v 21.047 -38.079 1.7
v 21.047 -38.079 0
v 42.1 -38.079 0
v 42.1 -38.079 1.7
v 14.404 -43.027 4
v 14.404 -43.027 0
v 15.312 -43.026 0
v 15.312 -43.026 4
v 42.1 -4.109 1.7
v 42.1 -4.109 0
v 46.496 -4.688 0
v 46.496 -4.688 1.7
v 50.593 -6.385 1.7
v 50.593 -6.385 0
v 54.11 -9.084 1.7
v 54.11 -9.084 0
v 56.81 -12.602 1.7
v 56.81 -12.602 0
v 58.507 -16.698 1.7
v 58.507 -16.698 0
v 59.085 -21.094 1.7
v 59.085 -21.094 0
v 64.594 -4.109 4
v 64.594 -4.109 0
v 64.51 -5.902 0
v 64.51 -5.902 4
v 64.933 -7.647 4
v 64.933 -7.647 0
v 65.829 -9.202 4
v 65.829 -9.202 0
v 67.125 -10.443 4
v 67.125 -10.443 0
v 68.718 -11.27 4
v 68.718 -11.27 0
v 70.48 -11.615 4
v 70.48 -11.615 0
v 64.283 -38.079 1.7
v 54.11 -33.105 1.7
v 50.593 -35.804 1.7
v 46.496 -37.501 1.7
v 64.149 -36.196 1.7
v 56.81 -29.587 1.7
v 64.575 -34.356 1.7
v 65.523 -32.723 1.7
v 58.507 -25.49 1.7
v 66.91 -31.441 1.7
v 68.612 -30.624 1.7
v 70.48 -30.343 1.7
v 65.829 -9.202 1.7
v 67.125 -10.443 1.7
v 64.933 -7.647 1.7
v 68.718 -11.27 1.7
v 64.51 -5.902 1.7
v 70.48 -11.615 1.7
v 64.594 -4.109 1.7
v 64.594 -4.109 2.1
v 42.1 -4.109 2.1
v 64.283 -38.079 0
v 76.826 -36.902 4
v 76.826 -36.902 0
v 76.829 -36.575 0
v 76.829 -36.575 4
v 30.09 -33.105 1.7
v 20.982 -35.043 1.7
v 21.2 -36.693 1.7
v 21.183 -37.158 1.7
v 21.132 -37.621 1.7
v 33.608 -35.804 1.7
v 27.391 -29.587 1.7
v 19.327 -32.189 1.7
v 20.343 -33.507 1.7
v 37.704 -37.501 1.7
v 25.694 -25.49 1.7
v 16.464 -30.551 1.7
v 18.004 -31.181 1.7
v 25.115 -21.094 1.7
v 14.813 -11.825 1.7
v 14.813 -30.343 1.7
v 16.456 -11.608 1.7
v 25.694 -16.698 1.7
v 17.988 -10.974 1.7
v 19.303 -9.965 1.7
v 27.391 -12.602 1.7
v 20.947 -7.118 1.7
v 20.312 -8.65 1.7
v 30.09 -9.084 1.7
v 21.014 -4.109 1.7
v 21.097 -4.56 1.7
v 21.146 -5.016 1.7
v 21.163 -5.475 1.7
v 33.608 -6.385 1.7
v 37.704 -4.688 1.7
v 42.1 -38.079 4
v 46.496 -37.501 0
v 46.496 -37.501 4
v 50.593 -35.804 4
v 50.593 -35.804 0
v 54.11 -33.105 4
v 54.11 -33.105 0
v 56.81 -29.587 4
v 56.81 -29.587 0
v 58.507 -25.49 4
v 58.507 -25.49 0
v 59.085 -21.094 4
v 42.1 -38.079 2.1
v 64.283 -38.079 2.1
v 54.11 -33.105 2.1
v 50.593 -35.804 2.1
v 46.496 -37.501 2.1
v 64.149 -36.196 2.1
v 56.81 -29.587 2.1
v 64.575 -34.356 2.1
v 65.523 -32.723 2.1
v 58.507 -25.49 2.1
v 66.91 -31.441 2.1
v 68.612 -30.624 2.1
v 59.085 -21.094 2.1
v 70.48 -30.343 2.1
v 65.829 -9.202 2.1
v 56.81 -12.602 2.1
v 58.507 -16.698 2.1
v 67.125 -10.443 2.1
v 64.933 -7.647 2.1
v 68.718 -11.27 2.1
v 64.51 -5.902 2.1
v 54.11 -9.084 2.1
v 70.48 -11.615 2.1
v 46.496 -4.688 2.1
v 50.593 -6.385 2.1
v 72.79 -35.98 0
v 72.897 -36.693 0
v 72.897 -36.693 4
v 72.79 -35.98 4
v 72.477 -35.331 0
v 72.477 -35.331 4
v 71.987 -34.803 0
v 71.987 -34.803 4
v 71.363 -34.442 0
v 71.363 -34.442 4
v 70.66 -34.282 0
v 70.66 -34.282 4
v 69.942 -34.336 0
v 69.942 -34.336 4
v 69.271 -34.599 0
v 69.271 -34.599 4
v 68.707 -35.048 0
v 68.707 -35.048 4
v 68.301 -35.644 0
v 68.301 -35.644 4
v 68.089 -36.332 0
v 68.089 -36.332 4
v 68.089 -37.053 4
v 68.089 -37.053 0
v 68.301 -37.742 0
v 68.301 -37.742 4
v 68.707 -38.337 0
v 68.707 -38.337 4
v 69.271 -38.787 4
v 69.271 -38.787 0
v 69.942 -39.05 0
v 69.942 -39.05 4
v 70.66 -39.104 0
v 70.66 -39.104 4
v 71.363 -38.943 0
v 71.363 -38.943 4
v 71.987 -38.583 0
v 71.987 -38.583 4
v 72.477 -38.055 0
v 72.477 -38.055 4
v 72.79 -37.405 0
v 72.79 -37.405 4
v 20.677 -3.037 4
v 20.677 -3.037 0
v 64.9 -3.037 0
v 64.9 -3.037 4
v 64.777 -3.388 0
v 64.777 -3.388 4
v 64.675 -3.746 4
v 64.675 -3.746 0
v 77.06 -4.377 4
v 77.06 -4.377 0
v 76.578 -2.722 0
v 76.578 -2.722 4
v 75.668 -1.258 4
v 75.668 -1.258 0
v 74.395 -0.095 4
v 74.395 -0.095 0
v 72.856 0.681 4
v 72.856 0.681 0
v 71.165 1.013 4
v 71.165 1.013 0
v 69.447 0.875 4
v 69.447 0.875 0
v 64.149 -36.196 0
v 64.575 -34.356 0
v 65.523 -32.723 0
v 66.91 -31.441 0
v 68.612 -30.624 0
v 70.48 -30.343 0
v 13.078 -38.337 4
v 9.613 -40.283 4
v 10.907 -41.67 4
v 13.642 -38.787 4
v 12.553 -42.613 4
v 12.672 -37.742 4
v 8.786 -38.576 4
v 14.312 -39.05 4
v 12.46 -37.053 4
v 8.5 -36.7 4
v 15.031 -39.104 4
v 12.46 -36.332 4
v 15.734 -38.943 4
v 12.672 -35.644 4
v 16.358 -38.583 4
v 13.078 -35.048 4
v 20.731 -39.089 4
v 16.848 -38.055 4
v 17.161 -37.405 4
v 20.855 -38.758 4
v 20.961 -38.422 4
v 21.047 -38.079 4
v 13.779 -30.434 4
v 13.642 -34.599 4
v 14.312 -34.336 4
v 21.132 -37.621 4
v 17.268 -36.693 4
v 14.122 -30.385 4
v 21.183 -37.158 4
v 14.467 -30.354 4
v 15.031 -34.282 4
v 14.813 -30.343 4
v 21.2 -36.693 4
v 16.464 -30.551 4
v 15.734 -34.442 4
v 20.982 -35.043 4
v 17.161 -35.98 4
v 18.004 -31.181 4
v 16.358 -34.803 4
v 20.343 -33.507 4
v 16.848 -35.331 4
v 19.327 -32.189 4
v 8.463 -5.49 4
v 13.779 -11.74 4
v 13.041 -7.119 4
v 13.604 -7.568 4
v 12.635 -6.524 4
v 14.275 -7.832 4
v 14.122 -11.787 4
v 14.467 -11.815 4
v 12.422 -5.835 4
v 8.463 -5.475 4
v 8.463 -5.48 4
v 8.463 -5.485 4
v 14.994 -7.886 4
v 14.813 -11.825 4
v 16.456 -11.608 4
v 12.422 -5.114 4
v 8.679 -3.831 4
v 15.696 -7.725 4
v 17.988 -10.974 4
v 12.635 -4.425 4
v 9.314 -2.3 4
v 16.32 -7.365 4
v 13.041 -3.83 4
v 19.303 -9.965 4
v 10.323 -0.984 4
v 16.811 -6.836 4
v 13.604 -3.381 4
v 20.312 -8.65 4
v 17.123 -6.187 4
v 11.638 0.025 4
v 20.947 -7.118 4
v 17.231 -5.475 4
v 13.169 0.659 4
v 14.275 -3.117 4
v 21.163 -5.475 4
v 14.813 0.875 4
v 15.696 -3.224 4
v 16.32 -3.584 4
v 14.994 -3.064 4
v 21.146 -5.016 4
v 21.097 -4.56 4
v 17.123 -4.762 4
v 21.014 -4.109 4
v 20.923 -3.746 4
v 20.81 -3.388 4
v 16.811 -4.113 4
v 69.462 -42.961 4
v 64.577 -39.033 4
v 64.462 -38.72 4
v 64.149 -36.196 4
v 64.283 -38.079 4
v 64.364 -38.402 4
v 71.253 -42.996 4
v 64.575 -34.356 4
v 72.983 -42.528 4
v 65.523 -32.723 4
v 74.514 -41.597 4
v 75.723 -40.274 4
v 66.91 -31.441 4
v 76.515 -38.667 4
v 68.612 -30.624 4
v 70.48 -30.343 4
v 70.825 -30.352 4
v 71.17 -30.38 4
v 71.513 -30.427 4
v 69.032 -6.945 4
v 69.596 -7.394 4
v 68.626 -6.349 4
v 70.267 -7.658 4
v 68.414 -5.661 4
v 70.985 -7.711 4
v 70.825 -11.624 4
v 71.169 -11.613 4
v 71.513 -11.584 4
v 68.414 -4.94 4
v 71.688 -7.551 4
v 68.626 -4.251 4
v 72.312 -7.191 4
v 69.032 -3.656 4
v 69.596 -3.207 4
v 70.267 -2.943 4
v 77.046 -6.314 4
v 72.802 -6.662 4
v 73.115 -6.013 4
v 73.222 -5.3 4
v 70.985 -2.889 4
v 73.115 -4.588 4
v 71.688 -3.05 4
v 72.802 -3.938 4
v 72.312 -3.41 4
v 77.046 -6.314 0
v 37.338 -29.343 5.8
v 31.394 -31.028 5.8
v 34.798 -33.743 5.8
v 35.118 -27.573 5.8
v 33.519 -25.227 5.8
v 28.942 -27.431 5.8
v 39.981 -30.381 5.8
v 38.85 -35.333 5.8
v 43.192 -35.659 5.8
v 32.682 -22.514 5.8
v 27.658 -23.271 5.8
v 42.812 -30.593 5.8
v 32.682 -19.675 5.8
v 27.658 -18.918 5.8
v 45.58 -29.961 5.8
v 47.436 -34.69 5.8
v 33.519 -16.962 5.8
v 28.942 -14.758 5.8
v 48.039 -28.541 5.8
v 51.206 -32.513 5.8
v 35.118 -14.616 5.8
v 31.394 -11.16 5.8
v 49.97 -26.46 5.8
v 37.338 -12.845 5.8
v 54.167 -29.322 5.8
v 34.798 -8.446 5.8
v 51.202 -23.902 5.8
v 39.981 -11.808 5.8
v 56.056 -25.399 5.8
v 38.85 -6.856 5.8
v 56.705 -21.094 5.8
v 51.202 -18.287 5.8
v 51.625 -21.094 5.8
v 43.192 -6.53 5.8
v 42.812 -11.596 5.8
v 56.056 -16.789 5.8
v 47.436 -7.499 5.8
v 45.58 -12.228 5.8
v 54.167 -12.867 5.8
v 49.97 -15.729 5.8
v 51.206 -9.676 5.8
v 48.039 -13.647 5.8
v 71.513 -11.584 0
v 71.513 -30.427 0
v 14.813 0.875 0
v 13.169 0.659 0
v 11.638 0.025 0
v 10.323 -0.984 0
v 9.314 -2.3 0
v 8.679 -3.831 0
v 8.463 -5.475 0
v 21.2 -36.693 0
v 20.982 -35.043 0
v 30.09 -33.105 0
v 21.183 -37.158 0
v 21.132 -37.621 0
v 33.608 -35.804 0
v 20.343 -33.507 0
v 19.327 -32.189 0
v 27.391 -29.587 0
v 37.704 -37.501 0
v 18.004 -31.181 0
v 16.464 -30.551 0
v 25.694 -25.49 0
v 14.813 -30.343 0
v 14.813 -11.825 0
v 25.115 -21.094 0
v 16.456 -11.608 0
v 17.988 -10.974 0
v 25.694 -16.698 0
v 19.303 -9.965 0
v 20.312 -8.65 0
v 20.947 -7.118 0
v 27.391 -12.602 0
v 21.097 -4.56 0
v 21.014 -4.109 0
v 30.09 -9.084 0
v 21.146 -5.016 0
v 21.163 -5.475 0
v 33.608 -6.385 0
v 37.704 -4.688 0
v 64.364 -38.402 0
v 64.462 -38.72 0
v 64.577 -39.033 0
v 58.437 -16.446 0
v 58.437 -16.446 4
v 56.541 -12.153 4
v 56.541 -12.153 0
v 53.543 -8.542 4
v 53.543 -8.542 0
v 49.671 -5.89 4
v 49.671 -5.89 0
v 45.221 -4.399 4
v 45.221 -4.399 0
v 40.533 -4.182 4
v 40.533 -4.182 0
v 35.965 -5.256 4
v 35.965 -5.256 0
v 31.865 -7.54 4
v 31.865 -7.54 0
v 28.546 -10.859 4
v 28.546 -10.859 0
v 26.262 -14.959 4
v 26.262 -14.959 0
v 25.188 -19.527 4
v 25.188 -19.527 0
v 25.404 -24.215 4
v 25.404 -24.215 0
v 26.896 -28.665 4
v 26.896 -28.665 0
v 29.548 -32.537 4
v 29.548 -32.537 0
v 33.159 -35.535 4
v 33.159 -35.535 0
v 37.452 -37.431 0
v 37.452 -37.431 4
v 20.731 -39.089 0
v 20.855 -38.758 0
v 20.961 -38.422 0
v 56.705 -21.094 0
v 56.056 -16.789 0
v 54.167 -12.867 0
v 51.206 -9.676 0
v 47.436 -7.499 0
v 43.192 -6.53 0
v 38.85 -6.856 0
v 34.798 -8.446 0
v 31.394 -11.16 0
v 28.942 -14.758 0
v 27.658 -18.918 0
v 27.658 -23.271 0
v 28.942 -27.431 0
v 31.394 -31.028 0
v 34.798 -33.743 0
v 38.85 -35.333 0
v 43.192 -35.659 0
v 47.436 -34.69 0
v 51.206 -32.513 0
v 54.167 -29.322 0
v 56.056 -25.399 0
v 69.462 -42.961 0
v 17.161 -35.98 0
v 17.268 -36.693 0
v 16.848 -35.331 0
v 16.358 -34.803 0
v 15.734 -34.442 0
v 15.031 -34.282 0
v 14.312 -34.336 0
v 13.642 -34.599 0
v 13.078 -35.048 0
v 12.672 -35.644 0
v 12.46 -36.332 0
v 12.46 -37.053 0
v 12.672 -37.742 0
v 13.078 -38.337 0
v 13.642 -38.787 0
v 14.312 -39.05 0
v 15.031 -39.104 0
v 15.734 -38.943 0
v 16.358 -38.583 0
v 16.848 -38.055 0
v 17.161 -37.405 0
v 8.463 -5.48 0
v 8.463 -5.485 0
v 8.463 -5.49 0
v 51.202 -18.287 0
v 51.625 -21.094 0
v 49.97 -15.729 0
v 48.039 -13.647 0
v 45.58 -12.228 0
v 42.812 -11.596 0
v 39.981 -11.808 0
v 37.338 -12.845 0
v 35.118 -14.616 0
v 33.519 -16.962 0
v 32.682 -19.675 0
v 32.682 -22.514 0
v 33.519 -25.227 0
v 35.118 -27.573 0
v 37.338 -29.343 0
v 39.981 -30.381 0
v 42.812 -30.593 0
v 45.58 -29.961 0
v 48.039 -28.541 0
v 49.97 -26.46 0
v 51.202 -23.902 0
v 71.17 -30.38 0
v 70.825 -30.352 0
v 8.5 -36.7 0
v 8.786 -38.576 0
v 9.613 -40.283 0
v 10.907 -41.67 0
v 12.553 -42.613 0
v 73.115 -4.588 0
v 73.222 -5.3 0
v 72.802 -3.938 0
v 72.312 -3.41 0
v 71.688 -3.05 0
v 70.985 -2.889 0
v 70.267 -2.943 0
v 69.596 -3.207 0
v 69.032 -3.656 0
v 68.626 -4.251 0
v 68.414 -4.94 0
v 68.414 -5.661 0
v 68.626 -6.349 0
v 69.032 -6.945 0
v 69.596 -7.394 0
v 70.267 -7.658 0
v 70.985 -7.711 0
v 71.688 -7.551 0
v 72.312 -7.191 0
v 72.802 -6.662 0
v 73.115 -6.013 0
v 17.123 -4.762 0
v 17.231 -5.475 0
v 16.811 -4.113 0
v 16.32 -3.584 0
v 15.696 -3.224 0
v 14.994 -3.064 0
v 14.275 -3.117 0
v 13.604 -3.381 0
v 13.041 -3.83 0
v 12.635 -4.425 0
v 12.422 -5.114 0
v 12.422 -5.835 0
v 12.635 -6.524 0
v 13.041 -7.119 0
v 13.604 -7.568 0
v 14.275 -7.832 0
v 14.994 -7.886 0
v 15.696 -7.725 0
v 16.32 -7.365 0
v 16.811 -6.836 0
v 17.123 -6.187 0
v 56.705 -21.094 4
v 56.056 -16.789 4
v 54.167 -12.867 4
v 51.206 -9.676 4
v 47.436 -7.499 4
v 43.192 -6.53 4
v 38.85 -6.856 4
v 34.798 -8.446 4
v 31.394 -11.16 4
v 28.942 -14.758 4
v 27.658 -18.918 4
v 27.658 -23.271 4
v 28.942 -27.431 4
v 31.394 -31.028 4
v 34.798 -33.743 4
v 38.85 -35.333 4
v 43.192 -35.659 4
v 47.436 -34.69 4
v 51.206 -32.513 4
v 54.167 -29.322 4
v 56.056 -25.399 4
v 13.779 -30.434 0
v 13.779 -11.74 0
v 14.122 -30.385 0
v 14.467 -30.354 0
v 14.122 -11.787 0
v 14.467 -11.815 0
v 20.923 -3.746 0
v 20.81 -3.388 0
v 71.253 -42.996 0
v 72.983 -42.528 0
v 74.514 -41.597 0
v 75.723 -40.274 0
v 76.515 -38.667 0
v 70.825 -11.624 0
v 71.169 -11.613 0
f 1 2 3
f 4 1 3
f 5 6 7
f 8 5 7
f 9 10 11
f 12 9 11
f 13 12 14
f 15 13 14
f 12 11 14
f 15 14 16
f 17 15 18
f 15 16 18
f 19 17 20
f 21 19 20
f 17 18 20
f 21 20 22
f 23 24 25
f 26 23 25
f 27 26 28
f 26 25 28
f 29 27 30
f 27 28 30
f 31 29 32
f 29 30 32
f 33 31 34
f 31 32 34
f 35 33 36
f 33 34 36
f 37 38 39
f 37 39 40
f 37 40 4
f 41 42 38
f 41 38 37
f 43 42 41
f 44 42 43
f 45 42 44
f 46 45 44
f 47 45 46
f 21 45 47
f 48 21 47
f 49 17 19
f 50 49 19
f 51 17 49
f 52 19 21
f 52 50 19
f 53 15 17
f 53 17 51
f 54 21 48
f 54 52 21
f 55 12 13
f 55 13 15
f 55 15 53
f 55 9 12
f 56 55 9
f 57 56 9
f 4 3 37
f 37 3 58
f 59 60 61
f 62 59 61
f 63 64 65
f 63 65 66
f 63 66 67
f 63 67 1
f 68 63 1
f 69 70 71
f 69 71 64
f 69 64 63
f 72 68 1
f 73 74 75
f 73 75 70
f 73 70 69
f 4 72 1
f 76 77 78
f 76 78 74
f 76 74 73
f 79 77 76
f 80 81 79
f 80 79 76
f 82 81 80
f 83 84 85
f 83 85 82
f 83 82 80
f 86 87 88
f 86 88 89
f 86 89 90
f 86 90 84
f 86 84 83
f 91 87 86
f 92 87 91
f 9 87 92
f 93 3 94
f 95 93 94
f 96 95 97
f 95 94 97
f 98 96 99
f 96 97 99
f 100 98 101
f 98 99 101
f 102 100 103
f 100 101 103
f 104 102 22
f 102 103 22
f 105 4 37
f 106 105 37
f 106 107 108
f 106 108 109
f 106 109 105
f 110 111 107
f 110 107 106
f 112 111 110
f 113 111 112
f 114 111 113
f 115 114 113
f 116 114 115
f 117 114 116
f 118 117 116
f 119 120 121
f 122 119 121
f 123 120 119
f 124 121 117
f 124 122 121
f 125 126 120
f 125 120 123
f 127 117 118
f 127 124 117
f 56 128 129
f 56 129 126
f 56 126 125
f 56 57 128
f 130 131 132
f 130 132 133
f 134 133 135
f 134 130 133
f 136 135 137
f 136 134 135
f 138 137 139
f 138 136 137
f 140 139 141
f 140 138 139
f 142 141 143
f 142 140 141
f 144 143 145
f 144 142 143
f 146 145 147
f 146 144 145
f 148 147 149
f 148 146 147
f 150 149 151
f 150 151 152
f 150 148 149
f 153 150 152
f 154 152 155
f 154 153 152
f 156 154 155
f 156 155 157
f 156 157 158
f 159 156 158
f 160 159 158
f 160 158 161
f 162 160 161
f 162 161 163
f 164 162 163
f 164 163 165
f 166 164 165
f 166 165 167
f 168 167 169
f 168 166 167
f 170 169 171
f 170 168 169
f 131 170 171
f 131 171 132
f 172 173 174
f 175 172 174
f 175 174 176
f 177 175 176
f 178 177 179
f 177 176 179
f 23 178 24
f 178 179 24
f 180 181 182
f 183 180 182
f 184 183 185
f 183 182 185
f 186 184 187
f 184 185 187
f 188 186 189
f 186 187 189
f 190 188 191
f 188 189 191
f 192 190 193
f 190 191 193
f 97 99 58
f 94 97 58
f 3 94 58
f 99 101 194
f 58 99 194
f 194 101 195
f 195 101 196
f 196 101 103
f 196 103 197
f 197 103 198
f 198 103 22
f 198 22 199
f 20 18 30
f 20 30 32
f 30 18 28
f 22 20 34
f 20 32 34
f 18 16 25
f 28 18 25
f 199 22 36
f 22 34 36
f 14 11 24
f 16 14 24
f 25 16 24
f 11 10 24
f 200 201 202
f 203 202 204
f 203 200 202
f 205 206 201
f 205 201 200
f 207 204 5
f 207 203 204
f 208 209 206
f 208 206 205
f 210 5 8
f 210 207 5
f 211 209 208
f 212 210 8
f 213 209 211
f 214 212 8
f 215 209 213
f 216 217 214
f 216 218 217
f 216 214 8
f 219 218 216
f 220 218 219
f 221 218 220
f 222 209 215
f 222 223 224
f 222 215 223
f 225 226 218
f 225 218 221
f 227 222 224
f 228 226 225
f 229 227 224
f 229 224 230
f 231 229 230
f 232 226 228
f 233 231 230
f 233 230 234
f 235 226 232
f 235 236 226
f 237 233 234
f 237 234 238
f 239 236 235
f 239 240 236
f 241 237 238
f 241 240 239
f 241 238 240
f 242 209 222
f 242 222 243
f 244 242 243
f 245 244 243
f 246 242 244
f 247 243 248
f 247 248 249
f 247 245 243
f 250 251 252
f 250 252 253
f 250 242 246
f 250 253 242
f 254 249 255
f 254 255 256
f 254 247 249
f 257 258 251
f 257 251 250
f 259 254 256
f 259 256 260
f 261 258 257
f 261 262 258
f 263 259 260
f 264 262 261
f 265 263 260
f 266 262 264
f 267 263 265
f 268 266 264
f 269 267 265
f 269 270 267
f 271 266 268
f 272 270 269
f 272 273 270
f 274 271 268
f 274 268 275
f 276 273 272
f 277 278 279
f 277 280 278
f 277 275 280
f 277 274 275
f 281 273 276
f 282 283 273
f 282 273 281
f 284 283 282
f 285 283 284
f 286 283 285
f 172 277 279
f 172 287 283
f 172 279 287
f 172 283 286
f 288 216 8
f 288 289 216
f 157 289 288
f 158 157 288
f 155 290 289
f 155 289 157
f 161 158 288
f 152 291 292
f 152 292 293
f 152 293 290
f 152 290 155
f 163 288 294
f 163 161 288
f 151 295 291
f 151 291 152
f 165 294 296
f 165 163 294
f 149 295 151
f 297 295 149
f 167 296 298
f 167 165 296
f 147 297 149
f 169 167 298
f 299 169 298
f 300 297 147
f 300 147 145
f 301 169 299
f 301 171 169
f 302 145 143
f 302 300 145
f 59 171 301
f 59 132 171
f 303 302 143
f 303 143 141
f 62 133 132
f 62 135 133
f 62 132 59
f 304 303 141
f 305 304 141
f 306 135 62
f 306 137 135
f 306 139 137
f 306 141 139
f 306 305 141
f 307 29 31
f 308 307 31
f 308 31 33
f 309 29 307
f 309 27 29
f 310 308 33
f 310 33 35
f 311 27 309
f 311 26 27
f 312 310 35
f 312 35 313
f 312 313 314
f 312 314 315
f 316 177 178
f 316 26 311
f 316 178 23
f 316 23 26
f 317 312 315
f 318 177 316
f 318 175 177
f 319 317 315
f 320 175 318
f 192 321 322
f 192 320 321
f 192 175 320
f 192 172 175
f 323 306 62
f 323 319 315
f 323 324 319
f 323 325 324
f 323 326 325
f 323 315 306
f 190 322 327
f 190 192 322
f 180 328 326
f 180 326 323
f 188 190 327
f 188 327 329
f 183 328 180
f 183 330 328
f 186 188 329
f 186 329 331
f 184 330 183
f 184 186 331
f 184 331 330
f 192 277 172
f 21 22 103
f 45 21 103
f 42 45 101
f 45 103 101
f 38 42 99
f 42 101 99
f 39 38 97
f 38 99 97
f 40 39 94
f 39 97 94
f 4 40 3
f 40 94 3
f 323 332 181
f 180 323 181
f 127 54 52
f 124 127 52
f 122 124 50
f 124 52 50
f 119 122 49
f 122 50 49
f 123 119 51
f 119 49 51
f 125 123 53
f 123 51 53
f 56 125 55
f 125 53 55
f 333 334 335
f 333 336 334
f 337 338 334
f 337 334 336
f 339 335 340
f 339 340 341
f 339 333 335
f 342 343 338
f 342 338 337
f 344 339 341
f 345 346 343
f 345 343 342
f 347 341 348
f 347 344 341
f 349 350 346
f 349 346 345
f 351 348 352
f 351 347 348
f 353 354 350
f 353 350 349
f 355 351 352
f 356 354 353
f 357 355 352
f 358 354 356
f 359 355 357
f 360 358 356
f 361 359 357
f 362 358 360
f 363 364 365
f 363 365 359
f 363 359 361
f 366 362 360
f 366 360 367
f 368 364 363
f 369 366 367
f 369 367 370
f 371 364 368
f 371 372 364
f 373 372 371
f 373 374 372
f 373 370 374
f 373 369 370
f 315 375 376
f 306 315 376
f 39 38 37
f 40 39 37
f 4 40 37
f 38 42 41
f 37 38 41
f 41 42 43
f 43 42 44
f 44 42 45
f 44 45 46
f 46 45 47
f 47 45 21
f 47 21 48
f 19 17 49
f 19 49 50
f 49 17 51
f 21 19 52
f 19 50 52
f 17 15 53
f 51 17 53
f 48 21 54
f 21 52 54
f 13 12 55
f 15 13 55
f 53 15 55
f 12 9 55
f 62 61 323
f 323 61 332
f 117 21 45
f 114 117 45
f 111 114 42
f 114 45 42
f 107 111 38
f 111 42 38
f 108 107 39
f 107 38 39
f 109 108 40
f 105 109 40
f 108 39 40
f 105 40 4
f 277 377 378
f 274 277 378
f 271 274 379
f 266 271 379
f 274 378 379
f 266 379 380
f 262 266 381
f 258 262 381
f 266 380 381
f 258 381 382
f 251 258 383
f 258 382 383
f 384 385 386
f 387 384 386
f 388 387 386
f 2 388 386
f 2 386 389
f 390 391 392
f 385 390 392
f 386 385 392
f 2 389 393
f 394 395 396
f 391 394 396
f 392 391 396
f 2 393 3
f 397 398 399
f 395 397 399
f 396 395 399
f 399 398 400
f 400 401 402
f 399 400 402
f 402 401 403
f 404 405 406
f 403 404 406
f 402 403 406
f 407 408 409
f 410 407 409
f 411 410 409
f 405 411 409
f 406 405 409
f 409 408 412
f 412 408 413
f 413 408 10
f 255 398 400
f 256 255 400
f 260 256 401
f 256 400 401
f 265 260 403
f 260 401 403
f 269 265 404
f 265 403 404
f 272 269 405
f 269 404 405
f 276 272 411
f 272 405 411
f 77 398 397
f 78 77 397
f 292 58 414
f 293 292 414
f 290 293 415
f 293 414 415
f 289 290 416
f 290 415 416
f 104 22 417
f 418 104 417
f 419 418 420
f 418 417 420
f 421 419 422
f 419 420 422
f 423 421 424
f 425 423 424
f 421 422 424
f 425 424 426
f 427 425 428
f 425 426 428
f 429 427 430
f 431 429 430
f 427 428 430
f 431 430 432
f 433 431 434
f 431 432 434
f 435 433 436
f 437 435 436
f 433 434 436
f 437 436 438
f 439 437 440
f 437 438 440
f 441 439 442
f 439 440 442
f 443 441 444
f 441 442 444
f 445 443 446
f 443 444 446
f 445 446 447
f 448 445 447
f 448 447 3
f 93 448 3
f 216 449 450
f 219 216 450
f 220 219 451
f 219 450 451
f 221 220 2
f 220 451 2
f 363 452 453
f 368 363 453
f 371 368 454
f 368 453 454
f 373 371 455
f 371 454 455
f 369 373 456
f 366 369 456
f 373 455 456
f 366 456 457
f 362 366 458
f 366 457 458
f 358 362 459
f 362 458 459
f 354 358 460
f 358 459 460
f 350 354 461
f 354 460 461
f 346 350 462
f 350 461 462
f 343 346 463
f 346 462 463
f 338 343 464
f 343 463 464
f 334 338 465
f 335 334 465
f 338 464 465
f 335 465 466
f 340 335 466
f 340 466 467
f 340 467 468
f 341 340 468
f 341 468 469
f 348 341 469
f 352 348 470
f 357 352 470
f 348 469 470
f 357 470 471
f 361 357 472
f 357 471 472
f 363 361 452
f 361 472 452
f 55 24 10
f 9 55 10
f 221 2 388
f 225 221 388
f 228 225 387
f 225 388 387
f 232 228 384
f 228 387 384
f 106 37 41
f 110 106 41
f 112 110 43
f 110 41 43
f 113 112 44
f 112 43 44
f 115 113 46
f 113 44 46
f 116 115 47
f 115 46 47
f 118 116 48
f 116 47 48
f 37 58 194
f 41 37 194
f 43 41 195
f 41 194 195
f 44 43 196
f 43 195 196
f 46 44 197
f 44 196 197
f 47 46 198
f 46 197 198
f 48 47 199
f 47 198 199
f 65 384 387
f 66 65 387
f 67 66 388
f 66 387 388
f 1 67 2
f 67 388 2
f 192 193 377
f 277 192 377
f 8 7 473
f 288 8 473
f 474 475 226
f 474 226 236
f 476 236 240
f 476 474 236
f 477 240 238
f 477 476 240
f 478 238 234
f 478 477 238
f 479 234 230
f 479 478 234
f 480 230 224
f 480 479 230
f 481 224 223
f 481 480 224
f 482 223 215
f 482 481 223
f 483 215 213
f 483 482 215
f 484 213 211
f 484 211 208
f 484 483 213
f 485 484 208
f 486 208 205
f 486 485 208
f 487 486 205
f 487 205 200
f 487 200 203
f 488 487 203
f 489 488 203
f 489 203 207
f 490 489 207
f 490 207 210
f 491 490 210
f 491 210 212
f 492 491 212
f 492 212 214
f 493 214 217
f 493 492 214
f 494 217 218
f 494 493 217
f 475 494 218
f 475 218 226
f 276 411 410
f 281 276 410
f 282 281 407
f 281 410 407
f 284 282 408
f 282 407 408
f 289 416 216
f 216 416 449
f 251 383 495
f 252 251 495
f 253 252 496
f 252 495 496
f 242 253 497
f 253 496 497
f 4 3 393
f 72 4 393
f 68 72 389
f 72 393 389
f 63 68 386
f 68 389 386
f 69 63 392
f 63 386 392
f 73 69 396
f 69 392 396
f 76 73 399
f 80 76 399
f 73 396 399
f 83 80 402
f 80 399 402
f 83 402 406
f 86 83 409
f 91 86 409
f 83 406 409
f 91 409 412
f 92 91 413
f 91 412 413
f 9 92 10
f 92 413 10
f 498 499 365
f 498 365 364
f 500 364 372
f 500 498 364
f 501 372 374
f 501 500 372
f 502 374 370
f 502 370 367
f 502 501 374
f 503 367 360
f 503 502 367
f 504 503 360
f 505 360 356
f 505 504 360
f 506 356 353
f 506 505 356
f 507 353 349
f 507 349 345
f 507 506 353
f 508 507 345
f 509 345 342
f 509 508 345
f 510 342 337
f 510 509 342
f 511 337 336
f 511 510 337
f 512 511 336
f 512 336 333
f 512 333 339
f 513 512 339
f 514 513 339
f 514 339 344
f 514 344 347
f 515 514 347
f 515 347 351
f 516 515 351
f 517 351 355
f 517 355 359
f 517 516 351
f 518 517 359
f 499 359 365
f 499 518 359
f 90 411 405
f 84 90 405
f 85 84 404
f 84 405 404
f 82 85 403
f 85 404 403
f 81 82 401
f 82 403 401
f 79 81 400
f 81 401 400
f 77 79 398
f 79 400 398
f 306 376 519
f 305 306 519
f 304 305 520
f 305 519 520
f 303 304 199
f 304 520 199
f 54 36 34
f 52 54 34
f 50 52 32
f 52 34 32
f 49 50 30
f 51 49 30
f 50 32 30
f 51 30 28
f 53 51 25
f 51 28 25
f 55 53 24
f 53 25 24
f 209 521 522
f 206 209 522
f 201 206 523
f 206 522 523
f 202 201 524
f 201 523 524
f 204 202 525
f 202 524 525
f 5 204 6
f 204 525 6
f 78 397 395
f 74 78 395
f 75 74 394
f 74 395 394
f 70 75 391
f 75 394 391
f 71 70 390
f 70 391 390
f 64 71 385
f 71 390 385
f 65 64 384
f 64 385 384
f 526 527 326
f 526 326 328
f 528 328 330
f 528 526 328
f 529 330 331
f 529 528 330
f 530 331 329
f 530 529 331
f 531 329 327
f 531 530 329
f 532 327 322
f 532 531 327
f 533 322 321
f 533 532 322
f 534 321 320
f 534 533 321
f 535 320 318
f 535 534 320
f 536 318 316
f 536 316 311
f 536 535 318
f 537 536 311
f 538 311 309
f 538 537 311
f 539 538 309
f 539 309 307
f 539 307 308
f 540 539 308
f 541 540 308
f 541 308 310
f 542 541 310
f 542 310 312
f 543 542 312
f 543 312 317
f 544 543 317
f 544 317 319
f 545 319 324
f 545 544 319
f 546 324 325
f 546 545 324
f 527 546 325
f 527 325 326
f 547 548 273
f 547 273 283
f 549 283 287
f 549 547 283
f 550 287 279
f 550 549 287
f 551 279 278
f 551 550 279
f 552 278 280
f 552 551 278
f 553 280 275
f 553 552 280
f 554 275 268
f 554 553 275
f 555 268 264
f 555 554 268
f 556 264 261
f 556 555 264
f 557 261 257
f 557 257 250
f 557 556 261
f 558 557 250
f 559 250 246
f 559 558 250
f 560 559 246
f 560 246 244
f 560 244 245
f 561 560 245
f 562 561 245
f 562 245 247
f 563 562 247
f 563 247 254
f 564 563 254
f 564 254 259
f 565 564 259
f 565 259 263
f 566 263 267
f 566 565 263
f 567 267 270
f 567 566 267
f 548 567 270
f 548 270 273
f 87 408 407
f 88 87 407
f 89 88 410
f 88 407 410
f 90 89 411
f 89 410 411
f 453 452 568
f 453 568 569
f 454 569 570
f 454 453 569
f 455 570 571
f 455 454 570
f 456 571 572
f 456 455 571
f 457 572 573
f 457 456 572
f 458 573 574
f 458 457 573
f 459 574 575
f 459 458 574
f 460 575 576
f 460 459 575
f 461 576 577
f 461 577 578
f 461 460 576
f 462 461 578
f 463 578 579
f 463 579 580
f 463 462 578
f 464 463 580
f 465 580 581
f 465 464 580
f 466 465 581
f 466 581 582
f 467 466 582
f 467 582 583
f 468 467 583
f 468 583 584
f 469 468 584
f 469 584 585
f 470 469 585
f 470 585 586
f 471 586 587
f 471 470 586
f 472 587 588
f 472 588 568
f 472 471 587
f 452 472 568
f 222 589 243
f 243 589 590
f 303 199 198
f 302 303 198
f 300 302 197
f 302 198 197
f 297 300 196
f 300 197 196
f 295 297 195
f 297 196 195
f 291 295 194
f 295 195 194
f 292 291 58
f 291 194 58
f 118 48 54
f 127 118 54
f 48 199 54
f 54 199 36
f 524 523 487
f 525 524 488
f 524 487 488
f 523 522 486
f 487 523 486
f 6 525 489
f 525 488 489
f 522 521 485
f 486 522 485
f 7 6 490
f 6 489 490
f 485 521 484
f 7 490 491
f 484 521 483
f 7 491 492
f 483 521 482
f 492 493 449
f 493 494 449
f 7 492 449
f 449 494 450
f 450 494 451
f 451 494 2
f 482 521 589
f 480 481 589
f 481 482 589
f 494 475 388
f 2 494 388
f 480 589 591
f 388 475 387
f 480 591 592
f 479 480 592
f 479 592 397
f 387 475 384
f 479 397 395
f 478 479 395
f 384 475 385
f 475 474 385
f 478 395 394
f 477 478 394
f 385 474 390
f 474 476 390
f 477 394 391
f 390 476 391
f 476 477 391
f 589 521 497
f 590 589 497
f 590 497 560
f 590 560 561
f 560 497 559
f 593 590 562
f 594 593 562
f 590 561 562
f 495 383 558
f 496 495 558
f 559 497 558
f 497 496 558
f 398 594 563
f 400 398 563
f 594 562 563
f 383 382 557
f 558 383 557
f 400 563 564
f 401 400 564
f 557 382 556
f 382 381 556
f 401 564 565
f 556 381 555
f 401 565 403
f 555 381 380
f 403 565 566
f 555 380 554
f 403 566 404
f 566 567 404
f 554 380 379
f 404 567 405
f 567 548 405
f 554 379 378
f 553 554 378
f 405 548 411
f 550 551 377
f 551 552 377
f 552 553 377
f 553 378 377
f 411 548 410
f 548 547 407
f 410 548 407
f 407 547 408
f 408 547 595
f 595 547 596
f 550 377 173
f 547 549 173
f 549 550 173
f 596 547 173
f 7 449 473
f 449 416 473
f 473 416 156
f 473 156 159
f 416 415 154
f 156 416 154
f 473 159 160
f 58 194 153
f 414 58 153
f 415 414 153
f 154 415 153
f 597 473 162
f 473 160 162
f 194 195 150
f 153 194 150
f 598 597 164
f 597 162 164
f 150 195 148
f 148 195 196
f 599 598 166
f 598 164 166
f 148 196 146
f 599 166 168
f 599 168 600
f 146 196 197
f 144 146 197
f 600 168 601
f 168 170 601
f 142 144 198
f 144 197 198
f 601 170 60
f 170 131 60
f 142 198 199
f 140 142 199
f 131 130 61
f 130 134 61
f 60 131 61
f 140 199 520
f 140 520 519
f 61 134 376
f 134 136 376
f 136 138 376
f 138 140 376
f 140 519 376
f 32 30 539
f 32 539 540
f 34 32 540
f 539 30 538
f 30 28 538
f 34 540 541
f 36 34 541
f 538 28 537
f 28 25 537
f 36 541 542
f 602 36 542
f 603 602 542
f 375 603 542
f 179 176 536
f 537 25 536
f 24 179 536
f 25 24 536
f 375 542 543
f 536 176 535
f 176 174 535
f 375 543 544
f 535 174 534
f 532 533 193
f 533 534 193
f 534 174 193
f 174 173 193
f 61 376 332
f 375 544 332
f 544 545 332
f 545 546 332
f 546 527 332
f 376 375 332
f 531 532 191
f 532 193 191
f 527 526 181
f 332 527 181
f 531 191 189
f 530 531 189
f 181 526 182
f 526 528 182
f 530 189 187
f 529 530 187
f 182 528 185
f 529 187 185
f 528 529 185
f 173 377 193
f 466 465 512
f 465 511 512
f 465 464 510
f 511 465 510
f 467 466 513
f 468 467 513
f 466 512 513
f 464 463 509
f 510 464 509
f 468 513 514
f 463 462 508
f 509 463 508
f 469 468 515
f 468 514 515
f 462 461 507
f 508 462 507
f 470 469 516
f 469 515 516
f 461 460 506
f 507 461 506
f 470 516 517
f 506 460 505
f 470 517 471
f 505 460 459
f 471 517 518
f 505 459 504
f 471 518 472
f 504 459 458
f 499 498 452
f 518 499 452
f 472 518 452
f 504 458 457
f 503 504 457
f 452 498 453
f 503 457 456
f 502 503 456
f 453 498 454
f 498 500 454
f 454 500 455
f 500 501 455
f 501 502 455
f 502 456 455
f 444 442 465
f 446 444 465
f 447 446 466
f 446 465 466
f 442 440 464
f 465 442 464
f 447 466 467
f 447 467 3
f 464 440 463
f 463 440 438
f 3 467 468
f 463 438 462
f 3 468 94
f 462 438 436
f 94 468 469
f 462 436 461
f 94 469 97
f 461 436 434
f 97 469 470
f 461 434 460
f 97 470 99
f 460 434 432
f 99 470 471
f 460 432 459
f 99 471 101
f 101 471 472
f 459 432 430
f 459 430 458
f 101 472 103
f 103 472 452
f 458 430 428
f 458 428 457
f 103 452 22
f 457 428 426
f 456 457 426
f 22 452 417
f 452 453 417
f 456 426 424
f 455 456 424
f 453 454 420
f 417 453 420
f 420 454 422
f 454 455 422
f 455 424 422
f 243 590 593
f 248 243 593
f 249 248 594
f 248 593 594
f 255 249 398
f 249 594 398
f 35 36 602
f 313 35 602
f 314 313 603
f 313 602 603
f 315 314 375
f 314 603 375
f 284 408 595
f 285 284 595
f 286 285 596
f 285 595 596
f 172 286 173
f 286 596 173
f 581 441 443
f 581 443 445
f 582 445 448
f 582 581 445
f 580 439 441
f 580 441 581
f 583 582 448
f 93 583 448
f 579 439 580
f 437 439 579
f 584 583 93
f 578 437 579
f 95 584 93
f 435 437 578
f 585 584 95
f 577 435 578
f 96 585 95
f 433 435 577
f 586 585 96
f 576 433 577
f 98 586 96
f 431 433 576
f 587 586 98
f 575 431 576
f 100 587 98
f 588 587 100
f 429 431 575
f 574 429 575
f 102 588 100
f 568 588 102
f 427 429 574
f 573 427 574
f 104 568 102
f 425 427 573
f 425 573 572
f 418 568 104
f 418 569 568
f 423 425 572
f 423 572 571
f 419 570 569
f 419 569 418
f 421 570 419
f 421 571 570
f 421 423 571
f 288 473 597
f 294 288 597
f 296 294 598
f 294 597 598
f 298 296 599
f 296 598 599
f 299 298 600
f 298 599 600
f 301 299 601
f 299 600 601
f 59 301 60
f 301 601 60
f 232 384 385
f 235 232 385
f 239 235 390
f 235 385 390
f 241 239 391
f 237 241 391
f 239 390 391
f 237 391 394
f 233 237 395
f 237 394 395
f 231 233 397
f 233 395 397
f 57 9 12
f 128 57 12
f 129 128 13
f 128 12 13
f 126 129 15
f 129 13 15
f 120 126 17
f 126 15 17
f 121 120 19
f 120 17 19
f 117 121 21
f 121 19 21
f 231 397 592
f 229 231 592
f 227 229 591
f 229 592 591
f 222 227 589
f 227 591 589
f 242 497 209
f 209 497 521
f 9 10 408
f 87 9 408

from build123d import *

# Parameters (mm, degrees)
F0_R     = 14.605
F0_R_2   = 9.525
F2_DEPTH = 5.8
F3_DEPTH = 4
F0_R_3   = 2.417765634
F4_DEPTH = 4
F5_DEPTH = 1.7
F6_DEPTH = 0.4


# Not quite as in the source:
# - a feature of the source that left no trace in its solid (it failed there, or was rolled back) is left out


with BuildPart() as f2:
    # F0 (on Top) → F2 (new body)
    with BuildSketch(Plane.XY):
        with Locations((42.1002805233, -21.0943892598)):
            Circle(F0_R)
        with Locations((42.1002805233, -21.0943892598)):
            Circle(F0_R_2, mode=Mode.SUBTRACT)
    extrude(amount=F2_DEPTH)


with BuildPart() as f3:
    # F0 (on Top) → F3 (new body)
    with BuildSketch(Plane.XY):
        with BuildLine():
            ThreePointArc((59.0852805233, -21.0943892598), (54.1104892018, -9.0841805814), (42.1002805233, -4.1093892598))
            ThreePointArc((42.1002805233, -4.1093892598), (25.1152805233, -21.0943892491), (42.1002805018, -38.0793892598))
            ThreePointArc((42.1002805018, -38.0793892598), (54.1104891942, -33.1045979459), (59.0852805233, -21.0943892598))
        make_face()
        with Locations((42.1002805233, -21.0943892598)):
            Circle(F0_R, mode=Mode.SUBTRACT)
    extrude(amount=F3_DEPTH)


with BuildPart() as f4:
    # F0 (on Top) → F4 (new body)
    with BuildSketch(Plane.XY):
        with BuildLine():
            ThreePointArc((70.4796204309, -30.3428000003), (65.5234454038, -32.7230608274), (64.2828575481, -38.0793892598))
            ThreePointArc((64.2828575481, -38.0793892598), (64.4109470876, -38.56194522), (64.5765521859, -39.0329464262))
            ThreePointArc((64.5765521859, -39.0329464262), (66.5006688013, -41.6415820656), (69.4616174351, -42.960668051))
            ThreePointArc((69.4616174351, -42.960668051), (74.513790796, -41.596672905), (76.8261661024, -36.9022231109))
            Line((76.8261661024, -36.9022231109), (76.8285228203, -36.5747387894))
            ThreePointArc((76.8285228203, -36.5747387894), (75.2829744428, -32.5394531286), (71.5131238103, -30.4274691419))
            ThreePointArc((71.5131238103, -30.4274691419), (70.9981033377, -30.3640026837), (70.4796204309, -30.3428000003))
        make_face()
        with Locations((70.4796204309, -36.6928000003)):
            Circle(F0_R_3, mode=Mode.SUBTRACT)
        with BuildLine():
            ThreePointArc((77.0462929913, -6.3138761602), (75.1657734813, -9.8791990856), (71.5131238103, -11.5839077326))
            Line((71.5131238103, -11.5839077326), (71.5131238103, -30.4274691419))
            ThreePointArc((71.5131238103, -30.4274691419), (75.2829744428, -32.5394531286), (76.8285228203, -36.5747387894))
            Line((76.8285228203, -36.5747387894), (77.0462929913, -6.3138761602))
        make_face()
        with BuildLine():
            ThreePointArc((69.4468072263, 0.8754916674), (66.6800084328, -0.5074468562), (64.9001725386, -3.0372450128))
            ThreePointArc((64.9001725386, -3.0372450128), (64.7236558931, -3.5665671194), (64.5944887824, -4.1093892598))
            ThreePointArc((64.5944887824, -4.1093892598), (65.8285113374, -9.2019743288), (70.4796204309, -11.6153575458))
            ThreePointArc((70.4796204309, -11.6153575458), (70.9970160236, -11.6207925725), (71.5131238103, -11.5839077326))
            ThreePointArc((71.5131238103, -11.5839077326), (75.1657734813, -9.8791990856), (77.0462929913, -6.3138761602))
            Line((77.0462929913, -6.3138761602), (77.0602332407, -4.3767698617))
            ThreePointArc((77.0602332407, -4.3767698617), (74.3954165151, -0.0954010996), (69.4468072263, 0.8754916674))
        make_face()
        with Locations((70.8046832573, -5.3003555452)):
            Circle(F0_R_3, mode=Mode.SUBTRACT)
        with BuildLine():
            ThreePointArc((14.8128727451, 0.8754916674), (18.3374917259, -0.1925048263), (20.6765104821, -3.0372450128))
            Line((20.6765104821, -3.0372450128), (64.9001725386, -3.0372450128))
            ThreePointArc((64.9001725386, -3.0372450128), (66.6800084328, -0.5074468562), (69.4468072263, 0.8754916674))
            Line((69.4468072263, 0.8754916674), (14.8128727451, 0.8754916674))
        make_face()
        with BuildLine():
            ThreePointArc((14.8128727451, -11.8245083326), (19.3030008056, -9.9646363931), (21.1628727451, -5.4745083326))
            ThreePointArc((21.1628727451, -5.4745083326), (21.1256456301, -4.7879236676), (21.0144007759, -4.1093892598))
            ThreePointArc((21.0144007759, -4.1093892598), (20.8692272239, -3.5658254287), (20.6765104821, -3.0372450128))
            ThreePointArc((20.6765104821, -3.0372450128), (18.3374917259, -0.1925048263), (14.8128727451, 0.8754916674))
            ThreePointArc((14.8128727451, 0.8754916674), (10.3227446846, -0.984380272), (8.4628727451, -5.4745083326))
            ThreePointArc((8.4628727451, -5.4745083326), (9.9708557742, -9.5827161722), (13.7785803527, -11.7397089875))
            ThreePointArc((13.7785803527, -11.7397089875), (14.2939913324, -11.8032729892), (14.8128727451, -11.8245083326))
        make_face()
        with Locations((14.8128727451, -5.4745083326)):
            Circle(F0_R_3, mode=Mode.SUBTRACT)
        with BuildLine():
            ThreePointArc((13.7785803527, -11.7397089875), (9.9708557742, -9.5827161722), (8.4628727451, -5.4745083326))
            Line((8.4628727451, -5.4745083326), (8.5004888147, -36.7004494693))
            ThreePointArc((8.5004888147, -36.7004494693), (9.9936868257, -32.6020764465), (13.7785803527, -30.4339245321))
            Line((13.7785803527, -30.4339245321), (13.7785803527, -11.7397089875))
        make_face()
        with BuildLine():
            ThreePointArc((21.2004842073, -36.6928000003), (19.3272948586, -32.1893939124), (14.8128727451, -30.3429113889))
            ThreePointArc((14.8128727451, -30.3429113889), (14.2938632343, -30.3672428634), (13.7785803527, -30.4339245321))
            ThreePointArc((13.7785803527, -30.4339245321), (9.9936868257, -32.6020764465), (8.5004888147, -36.7004494693))
            ThreePointArc((8.5004888147, -36.7004494693), (10.207762887, -41.024963287), (14.4039206737, -43.0270782552))
            Line((14.4039206737, -43.0270782552), (15.3123271424, -43.0259825418))
            ThreePointArc((15.3123271424, -43.0259825418), (18.5830125205, -41.8299910996), (20.7310672048, -39.0888892326))
            ThreePointArc((20.7310672048, -39.0888892326), (20.9102155072, -38.5907348182), (21.0472470901, -38.0793892598))
            ThreePointArc((21.0472470901, -38.0793892598), (21.1620586664, -37.390315482), (21.2004842073, -36.6928000003))
        make_face()
        with Locations((14.8504842073, -36.6928000003)):
            Circle(F0_R_3, mode=Mode.SUBTRACT)
        with BuildLine():
            Line((64.5765521859, -39.0329464262), (20.7310672048, -39.0888892326))
            ThreePointArc((20.7310672048, -39.0888892326), (18.5830125205, -41.8299910996), (15.3123271424, -43.0259825418))
            Line((15.3123271424, -43.0259825418), (69.4616174351, -42.960668051))
            ThreePointArc((69.4616174351, -42.960668051), (66.5006688013, -41.6415820656), (64.5765521859, -39.0329464262))
        make_face()
    extrude(amount=F4_DEPTH)


with BuildPart() as f5:
    # F0 (on Top) → F5 (new body)
    with BuildSketch(Plane.XY):
        with BuildLine():
            ThreePointArc((21.0144007759, -4.1093892598), (21.1256456301, -4.7879236676), (21.1628727451, -5.4745083326))
            ThreePointArc((21.1628727451, -5.4745083326), (19.3030008056, -9.9646363931), (14.8128727451, -11.8245083326))
            Line((14.8128727451, -11.8245083326), (14.8128727451, -30.3429113889))
            ThreePointArc((14.8128727451, -30.3429113889), (19.3272948586, -32.1893939124), (21.2004842073, -36.6928000003))
            ThreePointArc((21.2004842073, -36.6928000003), (21.1620586664, -37.390315482), (21.0472470901, -38.0793892598))
            Line((21.0472470901, -38.0793892598), (42.1002805018, -38.0793892598))
            ThreePointArc((42.1002805018, -38.0793892598), (25.1152805233, -21.0943892491), (42.1002805233, -4.1093892598))
            Line((42.1002805233, -4.1093892598), (21.0144007759, -4.1093892598))
        make_face()
    extrude(amount=F5_DEPTH)


with BuildPart() as f5b:
    # F0 (on Top) → F5, piece 2 (new body)
    with BuildSketch(Plane.XY):
        with BuildLine():
            Line((64.5944887824, -4.1093892598), (42.1002805233, -4.1093892598))
            ThreePointArc((42.1002805233, -4.1093892598), (54.1104892018, -9.0841805814), (59.0852805233, -21.0943892598))
            ThreePointArc((59.0852805233, -21.0943892598), (54.1104891942, -33.1045979459), (42.1002805018, -38.0793892598))
            Line((42.1002805018, -38.0793892598), (64.2828575481, -38.0793892598))
            ThreePointArc((64.2828575481, -38.0793892598), (65.5234454038, -32.7230608274), (70.4796204309, -30.3428000003))
            Line((70.4796204309, -30.3428000003), (70.4796204309, -11.6153575458))
            ThreePointArc((70.4796204309, -11.6153575458), (65.8285113374, -9.2019743288), (64.5944887824, -4.1093892598))
        make_face()
    extrude(amount=F5_DEPTH)


with BuildPart() as f6:
    # F6 (new): a face of the model
    f6_faces = [f5b.part.faces().sort_by_distance(p)[0] for p in [
        (61.5462800448, -20.981916528, 1.7),
    ]]
    extrude(f6_faces, amount=F6_DEPTH)


solid = Compound([f2.part, f3.part, f4.part, f5.part, f5b.part, f6.part])
